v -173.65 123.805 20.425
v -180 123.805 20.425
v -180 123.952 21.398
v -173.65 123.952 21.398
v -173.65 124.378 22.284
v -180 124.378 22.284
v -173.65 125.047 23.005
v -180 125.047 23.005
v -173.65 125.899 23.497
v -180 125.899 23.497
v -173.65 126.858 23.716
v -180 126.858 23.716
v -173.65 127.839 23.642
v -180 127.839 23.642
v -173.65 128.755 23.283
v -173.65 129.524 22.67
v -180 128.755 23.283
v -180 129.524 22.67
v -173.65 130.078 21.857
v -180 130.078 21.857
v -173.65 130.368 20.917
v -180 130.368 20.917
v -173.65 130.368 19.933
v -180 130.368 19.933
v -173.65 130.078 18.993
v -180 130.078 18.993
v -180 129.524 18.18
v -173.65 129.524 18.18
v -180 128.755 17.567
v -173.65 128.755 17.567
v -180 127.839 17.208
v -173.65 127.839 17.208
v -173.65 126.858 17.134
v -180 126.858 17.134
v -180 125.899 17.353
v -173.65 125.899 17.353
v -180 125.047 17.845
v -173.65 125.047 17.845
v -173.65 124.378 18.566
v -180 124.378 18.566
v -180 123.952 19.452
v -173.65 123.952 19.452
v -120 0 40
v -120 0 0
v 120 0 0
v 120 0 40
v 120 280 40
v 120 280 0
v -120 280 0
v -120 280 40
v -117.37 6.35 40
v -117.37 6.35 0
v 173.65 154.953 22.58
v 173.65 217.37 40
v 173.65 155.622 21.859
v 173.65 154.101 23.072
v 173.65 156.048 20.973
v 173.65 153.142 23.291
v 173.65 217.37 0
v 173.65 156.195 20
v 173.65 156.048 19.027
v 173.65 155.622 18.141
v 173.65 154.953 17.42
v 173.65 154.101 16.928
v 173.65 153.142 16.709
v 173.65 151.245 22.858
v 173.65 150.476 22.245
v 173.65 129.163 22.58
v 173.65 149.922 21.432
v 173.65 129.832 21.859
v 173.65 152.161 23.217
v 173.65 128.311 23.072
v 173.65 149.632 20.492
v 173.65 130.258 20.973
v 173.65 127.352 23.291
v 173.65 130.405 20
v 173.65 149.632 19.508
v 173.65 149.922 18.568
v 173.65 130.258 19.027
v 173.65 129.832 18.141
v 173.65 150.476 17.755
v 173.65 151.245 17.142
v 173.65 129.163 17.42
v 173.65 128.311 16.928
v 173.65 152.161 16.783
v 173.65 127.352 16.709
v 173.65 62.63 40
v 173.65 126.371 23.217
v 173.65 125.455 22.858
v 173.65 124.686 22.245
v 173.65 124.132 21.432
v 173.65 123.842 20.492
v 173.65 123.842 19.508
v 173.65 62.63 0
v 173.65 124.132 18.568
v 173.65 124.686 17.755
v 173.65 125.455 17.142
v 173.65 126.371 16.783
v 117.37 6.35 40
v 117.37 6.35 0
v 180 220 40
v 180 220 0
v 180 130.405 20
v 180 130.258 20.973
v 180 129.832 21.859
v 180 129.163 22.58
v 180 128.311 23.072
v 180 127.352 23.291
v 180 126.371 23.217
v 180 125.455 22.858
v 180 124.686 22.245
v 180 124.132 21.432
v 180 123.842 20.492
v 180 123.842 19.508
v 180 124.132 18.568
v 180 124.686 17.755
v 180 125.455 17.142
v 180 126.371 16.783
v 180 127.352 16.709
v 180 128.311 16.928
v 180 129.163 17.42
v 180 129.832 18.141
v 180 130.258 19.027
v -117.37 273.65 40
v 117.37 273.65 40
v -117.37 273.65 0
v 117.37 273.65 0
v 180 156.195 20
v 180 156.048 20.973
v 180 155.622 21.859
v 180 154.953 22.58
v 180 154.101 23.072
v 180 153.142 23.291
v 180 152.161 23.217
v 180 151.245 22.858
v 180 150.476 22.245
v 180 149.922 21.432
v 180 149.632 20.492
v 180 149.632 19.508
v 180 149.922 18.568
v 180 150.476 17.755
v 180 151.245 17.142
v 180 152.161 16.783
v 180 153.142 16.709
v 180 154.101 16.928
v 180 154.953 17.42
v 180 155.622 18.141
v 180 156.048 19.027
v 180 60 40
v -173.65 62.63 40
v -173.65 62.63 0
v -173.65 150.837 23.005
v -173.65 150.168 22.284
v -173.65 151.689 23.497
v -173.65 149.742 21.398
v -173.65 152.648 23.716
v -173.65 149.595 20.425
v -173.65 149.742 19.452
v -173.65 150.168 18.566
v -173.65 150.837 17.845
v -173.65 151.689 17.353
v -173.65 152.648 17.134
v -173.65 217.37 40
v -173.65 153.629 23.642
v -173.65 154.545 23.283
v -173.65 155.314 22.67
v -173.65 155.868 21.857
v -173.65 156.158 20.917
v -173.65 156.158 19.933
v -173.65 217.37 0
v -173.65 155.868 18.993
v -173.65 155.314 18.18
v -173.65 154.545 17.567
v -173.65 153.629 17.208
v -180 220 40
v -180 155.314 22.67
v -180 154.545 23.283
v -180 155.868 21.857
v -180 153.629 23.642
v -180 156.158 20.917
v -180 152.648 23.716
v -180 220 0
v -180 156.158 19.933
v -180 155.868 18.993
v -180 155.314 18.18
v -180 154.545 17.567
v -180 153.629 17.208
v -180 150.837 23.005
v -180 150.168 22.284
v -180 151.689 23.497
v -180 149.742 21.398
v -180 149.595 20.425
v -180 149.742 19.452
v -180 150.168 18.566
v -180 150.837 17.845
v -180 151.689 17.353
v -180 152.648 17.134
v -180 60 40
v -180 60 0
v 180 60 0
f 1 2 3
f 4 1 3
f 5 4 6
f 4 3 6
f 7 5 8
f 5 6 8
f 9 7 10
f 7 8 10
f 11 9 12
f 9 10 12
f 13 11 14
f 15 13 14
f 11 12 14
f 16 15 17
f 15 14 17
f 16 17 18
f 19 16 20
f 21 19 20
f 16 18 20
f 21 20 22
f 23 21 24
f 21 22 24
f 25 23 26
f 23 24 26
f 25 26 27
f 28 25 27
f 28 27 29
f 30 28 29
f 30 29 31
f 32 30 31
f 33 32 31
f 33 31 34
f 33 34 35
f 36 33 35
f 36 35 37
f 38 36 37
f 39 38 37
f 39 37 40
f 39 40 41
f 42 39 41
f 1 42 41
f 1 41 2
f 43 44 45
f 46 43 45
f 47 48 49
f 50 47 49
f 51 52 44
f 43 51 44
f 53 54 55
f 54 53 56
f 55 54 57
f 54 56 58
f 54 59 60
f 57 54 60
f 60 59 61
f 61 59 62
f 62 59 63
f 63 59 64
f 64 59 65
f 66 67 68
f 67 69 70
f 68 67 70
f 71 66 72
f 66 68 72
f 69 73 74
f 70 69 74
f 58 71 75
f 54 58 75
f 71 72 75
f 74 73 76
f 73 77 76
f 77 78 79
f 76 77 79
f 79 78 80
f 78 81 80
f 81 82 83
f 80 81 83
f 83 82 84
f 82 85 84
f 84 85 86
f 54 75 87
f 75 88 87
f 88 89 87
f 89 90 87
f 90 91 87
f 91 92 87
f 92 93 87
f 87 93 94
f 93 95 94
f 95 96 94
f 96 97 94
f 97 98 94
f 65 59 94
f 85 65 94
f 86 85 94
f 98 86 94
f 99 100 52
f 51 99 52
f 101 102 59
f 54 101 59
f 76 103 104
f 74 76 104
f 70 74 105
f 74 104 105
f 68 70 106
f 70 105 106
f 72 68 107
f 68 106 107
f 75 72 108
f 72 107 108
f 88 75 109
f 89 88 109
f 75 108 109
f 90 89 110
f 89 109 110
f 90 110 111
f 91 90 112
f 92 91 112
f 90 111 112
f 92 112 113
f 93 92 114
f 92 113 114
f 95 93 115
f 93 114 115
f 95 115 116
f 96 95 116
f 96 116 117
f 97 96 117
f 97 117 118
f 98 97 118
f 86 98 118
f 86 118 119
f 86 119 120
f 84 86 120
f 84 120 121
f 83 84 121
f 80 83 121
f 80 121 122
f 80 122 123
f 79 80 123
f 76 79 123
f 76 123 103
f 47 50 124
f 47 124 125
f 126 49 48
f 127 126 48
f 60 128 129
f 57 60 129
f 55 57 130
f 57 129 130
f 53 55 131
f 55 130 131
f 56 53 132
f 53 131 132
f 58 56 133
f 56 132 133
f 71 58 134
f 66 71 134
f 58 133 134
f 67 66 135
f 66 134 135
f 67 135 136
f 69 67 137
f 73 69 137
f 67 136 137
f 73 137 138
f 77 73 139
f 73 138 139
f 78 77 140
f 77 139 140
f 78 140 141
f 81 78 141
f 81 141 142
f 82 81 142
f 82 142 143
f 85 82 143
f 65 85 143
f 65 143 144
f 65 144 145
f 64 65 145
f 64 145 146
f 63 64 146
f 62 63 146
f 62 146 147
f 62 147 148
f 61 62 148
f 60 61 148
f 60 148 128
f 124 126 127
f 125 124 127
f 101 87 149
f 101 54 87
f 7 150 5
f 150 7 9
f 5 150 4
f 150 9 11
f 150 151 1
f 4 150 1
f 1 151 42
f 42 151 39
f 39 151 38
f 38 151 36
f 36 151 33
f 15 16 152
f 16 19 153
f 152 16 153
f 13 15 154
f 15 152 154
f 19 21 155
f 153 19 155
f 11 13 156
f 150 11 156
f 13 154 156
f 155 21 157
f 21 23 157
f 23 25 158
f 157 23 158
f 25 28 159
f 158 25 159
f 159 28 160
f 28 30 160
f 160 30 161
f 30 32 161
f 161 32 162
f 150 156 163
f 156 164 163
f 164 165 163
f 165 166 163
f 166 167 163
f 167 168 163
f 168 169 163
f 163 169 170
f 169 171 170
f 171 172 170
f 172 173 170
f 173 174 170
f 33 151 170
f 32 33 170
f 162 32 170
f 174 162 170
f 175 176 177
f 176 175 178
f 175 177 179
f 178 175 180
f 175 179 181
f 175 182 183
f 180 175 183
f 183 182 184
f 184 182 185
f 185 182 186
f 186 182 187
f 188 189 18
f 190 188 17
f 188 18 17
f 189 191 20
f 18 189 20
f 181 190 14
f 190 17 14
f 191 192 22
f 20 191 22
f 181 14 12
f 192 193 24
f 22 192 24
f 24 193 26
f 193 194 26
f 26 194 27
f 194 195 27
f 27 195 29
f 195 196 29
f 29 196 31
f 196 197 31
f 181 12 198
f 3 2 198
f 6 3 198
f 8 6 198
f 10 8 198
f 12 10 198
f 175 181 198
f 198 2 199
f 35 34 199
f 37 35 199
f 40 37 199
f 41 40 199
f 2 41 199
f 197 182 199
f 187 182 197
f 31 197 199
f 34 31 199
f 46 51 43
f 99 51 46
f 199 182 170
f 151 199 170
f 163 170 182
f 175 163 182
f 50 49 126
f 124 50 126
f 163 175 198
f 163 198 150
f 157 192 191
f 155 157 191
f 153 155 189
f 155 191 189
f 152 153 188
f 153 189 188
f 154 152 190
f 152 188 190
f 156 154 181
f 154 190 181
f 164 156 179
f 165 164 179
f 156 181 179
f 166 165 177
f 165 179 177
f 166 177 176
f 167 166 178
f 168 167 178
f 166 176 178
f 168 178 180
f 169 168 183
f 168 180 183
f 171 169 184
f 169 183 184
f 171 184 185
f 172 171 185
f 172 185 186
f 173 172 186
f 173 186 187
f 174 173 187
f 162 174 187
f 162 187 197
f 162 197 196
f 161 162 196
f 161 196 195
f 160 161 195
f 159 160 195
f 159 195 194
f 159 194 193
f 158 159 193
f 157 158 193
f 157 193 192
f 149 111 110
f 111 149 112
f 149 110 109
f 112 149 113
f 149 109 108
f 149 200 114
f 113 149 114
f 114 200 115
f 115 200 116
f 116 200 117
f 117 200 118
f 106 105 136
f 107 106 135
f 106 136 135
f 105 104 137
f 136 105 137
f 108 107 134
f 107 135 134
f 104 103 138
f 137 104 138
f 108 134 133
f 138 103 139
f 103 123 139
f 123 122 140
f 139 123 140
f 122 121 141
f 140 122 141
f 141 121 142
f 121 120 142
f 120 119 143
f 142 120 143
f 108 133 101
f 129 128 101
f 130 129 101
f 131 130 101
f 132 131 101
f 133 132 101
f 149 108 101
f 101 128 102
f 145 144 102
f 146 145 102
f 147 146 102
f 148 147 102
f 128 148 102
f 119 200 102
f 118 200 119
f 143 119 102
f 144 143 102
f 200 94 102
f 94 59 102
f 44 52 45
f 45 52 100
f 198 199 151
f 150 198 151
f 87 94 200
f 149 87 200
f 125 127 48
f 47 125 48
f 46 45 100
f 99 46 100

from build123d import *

# Parameters (mm, degrees)
F1_DEPTH = 40
F2_DEPTH = 40
F3_DEPTH = 40
F4_DEPTH = 40
F6_D     = 6.6
F8_D     = 6.6


with BuildPart() as f1:
    # F0 (on Top) → F1 (new body)
    with BuildSketch(Plane.XY):
        Polygon((120, 280), (-120, 280), (-117.3697438789, 273.65), (117.3697438789, 273.65), align=None)
    extrude(amount=F1_DEPTH)


with BuildPart() as f2:
    # F0 (on Top) → F2 (new body)
    with BuildSketch(Plane.XY):
        Polygon((-180, 220), (-180, 60), (-173.65, 62.6302561211), (-173.65, 217.3697438789), align=None)
    extrude(amount=F2_DEPTH)

    # F6 (through all)
    with Locations(Plane.YZ.offset(-173.65)):
        with Locations((127.105, 20.425), (152.895, 20.425)):
            Hole(F6_D / 2)


with BuildPart() as f3:
    # F0 (on Top) → F3 (new body)
    with BuildSketch(Plane.XY):
        Polygon((173.65, 62.6302561211), (180, 60), (180, 220), (173.65, 217.3697438789), align=None)
    extrude(amount=F3_DEPTH)

    # F8 (through all)
    with Locations(Plane(origin=(173.65, 0, 0), x_dir=(0, -1, 0), z_dir=(-1, 0, 0))):
        with Locations((-127.105, 20), (-152.895, 20)):
            Hole(F8_D / 2)


with BuildPart() as f4:
    # F0 (on Top) → F4 (new body)
    with BuildSketch(Plane.XY):
        Polygon((-117.3697438789, 6.35), (-120, 0), (120, 0), (117.3697438789, 6.35), align=None)
    extrude(amount=F4_DEPTH)


solid = Compound([f1.part, f2.part, f3.part, f4.part])
